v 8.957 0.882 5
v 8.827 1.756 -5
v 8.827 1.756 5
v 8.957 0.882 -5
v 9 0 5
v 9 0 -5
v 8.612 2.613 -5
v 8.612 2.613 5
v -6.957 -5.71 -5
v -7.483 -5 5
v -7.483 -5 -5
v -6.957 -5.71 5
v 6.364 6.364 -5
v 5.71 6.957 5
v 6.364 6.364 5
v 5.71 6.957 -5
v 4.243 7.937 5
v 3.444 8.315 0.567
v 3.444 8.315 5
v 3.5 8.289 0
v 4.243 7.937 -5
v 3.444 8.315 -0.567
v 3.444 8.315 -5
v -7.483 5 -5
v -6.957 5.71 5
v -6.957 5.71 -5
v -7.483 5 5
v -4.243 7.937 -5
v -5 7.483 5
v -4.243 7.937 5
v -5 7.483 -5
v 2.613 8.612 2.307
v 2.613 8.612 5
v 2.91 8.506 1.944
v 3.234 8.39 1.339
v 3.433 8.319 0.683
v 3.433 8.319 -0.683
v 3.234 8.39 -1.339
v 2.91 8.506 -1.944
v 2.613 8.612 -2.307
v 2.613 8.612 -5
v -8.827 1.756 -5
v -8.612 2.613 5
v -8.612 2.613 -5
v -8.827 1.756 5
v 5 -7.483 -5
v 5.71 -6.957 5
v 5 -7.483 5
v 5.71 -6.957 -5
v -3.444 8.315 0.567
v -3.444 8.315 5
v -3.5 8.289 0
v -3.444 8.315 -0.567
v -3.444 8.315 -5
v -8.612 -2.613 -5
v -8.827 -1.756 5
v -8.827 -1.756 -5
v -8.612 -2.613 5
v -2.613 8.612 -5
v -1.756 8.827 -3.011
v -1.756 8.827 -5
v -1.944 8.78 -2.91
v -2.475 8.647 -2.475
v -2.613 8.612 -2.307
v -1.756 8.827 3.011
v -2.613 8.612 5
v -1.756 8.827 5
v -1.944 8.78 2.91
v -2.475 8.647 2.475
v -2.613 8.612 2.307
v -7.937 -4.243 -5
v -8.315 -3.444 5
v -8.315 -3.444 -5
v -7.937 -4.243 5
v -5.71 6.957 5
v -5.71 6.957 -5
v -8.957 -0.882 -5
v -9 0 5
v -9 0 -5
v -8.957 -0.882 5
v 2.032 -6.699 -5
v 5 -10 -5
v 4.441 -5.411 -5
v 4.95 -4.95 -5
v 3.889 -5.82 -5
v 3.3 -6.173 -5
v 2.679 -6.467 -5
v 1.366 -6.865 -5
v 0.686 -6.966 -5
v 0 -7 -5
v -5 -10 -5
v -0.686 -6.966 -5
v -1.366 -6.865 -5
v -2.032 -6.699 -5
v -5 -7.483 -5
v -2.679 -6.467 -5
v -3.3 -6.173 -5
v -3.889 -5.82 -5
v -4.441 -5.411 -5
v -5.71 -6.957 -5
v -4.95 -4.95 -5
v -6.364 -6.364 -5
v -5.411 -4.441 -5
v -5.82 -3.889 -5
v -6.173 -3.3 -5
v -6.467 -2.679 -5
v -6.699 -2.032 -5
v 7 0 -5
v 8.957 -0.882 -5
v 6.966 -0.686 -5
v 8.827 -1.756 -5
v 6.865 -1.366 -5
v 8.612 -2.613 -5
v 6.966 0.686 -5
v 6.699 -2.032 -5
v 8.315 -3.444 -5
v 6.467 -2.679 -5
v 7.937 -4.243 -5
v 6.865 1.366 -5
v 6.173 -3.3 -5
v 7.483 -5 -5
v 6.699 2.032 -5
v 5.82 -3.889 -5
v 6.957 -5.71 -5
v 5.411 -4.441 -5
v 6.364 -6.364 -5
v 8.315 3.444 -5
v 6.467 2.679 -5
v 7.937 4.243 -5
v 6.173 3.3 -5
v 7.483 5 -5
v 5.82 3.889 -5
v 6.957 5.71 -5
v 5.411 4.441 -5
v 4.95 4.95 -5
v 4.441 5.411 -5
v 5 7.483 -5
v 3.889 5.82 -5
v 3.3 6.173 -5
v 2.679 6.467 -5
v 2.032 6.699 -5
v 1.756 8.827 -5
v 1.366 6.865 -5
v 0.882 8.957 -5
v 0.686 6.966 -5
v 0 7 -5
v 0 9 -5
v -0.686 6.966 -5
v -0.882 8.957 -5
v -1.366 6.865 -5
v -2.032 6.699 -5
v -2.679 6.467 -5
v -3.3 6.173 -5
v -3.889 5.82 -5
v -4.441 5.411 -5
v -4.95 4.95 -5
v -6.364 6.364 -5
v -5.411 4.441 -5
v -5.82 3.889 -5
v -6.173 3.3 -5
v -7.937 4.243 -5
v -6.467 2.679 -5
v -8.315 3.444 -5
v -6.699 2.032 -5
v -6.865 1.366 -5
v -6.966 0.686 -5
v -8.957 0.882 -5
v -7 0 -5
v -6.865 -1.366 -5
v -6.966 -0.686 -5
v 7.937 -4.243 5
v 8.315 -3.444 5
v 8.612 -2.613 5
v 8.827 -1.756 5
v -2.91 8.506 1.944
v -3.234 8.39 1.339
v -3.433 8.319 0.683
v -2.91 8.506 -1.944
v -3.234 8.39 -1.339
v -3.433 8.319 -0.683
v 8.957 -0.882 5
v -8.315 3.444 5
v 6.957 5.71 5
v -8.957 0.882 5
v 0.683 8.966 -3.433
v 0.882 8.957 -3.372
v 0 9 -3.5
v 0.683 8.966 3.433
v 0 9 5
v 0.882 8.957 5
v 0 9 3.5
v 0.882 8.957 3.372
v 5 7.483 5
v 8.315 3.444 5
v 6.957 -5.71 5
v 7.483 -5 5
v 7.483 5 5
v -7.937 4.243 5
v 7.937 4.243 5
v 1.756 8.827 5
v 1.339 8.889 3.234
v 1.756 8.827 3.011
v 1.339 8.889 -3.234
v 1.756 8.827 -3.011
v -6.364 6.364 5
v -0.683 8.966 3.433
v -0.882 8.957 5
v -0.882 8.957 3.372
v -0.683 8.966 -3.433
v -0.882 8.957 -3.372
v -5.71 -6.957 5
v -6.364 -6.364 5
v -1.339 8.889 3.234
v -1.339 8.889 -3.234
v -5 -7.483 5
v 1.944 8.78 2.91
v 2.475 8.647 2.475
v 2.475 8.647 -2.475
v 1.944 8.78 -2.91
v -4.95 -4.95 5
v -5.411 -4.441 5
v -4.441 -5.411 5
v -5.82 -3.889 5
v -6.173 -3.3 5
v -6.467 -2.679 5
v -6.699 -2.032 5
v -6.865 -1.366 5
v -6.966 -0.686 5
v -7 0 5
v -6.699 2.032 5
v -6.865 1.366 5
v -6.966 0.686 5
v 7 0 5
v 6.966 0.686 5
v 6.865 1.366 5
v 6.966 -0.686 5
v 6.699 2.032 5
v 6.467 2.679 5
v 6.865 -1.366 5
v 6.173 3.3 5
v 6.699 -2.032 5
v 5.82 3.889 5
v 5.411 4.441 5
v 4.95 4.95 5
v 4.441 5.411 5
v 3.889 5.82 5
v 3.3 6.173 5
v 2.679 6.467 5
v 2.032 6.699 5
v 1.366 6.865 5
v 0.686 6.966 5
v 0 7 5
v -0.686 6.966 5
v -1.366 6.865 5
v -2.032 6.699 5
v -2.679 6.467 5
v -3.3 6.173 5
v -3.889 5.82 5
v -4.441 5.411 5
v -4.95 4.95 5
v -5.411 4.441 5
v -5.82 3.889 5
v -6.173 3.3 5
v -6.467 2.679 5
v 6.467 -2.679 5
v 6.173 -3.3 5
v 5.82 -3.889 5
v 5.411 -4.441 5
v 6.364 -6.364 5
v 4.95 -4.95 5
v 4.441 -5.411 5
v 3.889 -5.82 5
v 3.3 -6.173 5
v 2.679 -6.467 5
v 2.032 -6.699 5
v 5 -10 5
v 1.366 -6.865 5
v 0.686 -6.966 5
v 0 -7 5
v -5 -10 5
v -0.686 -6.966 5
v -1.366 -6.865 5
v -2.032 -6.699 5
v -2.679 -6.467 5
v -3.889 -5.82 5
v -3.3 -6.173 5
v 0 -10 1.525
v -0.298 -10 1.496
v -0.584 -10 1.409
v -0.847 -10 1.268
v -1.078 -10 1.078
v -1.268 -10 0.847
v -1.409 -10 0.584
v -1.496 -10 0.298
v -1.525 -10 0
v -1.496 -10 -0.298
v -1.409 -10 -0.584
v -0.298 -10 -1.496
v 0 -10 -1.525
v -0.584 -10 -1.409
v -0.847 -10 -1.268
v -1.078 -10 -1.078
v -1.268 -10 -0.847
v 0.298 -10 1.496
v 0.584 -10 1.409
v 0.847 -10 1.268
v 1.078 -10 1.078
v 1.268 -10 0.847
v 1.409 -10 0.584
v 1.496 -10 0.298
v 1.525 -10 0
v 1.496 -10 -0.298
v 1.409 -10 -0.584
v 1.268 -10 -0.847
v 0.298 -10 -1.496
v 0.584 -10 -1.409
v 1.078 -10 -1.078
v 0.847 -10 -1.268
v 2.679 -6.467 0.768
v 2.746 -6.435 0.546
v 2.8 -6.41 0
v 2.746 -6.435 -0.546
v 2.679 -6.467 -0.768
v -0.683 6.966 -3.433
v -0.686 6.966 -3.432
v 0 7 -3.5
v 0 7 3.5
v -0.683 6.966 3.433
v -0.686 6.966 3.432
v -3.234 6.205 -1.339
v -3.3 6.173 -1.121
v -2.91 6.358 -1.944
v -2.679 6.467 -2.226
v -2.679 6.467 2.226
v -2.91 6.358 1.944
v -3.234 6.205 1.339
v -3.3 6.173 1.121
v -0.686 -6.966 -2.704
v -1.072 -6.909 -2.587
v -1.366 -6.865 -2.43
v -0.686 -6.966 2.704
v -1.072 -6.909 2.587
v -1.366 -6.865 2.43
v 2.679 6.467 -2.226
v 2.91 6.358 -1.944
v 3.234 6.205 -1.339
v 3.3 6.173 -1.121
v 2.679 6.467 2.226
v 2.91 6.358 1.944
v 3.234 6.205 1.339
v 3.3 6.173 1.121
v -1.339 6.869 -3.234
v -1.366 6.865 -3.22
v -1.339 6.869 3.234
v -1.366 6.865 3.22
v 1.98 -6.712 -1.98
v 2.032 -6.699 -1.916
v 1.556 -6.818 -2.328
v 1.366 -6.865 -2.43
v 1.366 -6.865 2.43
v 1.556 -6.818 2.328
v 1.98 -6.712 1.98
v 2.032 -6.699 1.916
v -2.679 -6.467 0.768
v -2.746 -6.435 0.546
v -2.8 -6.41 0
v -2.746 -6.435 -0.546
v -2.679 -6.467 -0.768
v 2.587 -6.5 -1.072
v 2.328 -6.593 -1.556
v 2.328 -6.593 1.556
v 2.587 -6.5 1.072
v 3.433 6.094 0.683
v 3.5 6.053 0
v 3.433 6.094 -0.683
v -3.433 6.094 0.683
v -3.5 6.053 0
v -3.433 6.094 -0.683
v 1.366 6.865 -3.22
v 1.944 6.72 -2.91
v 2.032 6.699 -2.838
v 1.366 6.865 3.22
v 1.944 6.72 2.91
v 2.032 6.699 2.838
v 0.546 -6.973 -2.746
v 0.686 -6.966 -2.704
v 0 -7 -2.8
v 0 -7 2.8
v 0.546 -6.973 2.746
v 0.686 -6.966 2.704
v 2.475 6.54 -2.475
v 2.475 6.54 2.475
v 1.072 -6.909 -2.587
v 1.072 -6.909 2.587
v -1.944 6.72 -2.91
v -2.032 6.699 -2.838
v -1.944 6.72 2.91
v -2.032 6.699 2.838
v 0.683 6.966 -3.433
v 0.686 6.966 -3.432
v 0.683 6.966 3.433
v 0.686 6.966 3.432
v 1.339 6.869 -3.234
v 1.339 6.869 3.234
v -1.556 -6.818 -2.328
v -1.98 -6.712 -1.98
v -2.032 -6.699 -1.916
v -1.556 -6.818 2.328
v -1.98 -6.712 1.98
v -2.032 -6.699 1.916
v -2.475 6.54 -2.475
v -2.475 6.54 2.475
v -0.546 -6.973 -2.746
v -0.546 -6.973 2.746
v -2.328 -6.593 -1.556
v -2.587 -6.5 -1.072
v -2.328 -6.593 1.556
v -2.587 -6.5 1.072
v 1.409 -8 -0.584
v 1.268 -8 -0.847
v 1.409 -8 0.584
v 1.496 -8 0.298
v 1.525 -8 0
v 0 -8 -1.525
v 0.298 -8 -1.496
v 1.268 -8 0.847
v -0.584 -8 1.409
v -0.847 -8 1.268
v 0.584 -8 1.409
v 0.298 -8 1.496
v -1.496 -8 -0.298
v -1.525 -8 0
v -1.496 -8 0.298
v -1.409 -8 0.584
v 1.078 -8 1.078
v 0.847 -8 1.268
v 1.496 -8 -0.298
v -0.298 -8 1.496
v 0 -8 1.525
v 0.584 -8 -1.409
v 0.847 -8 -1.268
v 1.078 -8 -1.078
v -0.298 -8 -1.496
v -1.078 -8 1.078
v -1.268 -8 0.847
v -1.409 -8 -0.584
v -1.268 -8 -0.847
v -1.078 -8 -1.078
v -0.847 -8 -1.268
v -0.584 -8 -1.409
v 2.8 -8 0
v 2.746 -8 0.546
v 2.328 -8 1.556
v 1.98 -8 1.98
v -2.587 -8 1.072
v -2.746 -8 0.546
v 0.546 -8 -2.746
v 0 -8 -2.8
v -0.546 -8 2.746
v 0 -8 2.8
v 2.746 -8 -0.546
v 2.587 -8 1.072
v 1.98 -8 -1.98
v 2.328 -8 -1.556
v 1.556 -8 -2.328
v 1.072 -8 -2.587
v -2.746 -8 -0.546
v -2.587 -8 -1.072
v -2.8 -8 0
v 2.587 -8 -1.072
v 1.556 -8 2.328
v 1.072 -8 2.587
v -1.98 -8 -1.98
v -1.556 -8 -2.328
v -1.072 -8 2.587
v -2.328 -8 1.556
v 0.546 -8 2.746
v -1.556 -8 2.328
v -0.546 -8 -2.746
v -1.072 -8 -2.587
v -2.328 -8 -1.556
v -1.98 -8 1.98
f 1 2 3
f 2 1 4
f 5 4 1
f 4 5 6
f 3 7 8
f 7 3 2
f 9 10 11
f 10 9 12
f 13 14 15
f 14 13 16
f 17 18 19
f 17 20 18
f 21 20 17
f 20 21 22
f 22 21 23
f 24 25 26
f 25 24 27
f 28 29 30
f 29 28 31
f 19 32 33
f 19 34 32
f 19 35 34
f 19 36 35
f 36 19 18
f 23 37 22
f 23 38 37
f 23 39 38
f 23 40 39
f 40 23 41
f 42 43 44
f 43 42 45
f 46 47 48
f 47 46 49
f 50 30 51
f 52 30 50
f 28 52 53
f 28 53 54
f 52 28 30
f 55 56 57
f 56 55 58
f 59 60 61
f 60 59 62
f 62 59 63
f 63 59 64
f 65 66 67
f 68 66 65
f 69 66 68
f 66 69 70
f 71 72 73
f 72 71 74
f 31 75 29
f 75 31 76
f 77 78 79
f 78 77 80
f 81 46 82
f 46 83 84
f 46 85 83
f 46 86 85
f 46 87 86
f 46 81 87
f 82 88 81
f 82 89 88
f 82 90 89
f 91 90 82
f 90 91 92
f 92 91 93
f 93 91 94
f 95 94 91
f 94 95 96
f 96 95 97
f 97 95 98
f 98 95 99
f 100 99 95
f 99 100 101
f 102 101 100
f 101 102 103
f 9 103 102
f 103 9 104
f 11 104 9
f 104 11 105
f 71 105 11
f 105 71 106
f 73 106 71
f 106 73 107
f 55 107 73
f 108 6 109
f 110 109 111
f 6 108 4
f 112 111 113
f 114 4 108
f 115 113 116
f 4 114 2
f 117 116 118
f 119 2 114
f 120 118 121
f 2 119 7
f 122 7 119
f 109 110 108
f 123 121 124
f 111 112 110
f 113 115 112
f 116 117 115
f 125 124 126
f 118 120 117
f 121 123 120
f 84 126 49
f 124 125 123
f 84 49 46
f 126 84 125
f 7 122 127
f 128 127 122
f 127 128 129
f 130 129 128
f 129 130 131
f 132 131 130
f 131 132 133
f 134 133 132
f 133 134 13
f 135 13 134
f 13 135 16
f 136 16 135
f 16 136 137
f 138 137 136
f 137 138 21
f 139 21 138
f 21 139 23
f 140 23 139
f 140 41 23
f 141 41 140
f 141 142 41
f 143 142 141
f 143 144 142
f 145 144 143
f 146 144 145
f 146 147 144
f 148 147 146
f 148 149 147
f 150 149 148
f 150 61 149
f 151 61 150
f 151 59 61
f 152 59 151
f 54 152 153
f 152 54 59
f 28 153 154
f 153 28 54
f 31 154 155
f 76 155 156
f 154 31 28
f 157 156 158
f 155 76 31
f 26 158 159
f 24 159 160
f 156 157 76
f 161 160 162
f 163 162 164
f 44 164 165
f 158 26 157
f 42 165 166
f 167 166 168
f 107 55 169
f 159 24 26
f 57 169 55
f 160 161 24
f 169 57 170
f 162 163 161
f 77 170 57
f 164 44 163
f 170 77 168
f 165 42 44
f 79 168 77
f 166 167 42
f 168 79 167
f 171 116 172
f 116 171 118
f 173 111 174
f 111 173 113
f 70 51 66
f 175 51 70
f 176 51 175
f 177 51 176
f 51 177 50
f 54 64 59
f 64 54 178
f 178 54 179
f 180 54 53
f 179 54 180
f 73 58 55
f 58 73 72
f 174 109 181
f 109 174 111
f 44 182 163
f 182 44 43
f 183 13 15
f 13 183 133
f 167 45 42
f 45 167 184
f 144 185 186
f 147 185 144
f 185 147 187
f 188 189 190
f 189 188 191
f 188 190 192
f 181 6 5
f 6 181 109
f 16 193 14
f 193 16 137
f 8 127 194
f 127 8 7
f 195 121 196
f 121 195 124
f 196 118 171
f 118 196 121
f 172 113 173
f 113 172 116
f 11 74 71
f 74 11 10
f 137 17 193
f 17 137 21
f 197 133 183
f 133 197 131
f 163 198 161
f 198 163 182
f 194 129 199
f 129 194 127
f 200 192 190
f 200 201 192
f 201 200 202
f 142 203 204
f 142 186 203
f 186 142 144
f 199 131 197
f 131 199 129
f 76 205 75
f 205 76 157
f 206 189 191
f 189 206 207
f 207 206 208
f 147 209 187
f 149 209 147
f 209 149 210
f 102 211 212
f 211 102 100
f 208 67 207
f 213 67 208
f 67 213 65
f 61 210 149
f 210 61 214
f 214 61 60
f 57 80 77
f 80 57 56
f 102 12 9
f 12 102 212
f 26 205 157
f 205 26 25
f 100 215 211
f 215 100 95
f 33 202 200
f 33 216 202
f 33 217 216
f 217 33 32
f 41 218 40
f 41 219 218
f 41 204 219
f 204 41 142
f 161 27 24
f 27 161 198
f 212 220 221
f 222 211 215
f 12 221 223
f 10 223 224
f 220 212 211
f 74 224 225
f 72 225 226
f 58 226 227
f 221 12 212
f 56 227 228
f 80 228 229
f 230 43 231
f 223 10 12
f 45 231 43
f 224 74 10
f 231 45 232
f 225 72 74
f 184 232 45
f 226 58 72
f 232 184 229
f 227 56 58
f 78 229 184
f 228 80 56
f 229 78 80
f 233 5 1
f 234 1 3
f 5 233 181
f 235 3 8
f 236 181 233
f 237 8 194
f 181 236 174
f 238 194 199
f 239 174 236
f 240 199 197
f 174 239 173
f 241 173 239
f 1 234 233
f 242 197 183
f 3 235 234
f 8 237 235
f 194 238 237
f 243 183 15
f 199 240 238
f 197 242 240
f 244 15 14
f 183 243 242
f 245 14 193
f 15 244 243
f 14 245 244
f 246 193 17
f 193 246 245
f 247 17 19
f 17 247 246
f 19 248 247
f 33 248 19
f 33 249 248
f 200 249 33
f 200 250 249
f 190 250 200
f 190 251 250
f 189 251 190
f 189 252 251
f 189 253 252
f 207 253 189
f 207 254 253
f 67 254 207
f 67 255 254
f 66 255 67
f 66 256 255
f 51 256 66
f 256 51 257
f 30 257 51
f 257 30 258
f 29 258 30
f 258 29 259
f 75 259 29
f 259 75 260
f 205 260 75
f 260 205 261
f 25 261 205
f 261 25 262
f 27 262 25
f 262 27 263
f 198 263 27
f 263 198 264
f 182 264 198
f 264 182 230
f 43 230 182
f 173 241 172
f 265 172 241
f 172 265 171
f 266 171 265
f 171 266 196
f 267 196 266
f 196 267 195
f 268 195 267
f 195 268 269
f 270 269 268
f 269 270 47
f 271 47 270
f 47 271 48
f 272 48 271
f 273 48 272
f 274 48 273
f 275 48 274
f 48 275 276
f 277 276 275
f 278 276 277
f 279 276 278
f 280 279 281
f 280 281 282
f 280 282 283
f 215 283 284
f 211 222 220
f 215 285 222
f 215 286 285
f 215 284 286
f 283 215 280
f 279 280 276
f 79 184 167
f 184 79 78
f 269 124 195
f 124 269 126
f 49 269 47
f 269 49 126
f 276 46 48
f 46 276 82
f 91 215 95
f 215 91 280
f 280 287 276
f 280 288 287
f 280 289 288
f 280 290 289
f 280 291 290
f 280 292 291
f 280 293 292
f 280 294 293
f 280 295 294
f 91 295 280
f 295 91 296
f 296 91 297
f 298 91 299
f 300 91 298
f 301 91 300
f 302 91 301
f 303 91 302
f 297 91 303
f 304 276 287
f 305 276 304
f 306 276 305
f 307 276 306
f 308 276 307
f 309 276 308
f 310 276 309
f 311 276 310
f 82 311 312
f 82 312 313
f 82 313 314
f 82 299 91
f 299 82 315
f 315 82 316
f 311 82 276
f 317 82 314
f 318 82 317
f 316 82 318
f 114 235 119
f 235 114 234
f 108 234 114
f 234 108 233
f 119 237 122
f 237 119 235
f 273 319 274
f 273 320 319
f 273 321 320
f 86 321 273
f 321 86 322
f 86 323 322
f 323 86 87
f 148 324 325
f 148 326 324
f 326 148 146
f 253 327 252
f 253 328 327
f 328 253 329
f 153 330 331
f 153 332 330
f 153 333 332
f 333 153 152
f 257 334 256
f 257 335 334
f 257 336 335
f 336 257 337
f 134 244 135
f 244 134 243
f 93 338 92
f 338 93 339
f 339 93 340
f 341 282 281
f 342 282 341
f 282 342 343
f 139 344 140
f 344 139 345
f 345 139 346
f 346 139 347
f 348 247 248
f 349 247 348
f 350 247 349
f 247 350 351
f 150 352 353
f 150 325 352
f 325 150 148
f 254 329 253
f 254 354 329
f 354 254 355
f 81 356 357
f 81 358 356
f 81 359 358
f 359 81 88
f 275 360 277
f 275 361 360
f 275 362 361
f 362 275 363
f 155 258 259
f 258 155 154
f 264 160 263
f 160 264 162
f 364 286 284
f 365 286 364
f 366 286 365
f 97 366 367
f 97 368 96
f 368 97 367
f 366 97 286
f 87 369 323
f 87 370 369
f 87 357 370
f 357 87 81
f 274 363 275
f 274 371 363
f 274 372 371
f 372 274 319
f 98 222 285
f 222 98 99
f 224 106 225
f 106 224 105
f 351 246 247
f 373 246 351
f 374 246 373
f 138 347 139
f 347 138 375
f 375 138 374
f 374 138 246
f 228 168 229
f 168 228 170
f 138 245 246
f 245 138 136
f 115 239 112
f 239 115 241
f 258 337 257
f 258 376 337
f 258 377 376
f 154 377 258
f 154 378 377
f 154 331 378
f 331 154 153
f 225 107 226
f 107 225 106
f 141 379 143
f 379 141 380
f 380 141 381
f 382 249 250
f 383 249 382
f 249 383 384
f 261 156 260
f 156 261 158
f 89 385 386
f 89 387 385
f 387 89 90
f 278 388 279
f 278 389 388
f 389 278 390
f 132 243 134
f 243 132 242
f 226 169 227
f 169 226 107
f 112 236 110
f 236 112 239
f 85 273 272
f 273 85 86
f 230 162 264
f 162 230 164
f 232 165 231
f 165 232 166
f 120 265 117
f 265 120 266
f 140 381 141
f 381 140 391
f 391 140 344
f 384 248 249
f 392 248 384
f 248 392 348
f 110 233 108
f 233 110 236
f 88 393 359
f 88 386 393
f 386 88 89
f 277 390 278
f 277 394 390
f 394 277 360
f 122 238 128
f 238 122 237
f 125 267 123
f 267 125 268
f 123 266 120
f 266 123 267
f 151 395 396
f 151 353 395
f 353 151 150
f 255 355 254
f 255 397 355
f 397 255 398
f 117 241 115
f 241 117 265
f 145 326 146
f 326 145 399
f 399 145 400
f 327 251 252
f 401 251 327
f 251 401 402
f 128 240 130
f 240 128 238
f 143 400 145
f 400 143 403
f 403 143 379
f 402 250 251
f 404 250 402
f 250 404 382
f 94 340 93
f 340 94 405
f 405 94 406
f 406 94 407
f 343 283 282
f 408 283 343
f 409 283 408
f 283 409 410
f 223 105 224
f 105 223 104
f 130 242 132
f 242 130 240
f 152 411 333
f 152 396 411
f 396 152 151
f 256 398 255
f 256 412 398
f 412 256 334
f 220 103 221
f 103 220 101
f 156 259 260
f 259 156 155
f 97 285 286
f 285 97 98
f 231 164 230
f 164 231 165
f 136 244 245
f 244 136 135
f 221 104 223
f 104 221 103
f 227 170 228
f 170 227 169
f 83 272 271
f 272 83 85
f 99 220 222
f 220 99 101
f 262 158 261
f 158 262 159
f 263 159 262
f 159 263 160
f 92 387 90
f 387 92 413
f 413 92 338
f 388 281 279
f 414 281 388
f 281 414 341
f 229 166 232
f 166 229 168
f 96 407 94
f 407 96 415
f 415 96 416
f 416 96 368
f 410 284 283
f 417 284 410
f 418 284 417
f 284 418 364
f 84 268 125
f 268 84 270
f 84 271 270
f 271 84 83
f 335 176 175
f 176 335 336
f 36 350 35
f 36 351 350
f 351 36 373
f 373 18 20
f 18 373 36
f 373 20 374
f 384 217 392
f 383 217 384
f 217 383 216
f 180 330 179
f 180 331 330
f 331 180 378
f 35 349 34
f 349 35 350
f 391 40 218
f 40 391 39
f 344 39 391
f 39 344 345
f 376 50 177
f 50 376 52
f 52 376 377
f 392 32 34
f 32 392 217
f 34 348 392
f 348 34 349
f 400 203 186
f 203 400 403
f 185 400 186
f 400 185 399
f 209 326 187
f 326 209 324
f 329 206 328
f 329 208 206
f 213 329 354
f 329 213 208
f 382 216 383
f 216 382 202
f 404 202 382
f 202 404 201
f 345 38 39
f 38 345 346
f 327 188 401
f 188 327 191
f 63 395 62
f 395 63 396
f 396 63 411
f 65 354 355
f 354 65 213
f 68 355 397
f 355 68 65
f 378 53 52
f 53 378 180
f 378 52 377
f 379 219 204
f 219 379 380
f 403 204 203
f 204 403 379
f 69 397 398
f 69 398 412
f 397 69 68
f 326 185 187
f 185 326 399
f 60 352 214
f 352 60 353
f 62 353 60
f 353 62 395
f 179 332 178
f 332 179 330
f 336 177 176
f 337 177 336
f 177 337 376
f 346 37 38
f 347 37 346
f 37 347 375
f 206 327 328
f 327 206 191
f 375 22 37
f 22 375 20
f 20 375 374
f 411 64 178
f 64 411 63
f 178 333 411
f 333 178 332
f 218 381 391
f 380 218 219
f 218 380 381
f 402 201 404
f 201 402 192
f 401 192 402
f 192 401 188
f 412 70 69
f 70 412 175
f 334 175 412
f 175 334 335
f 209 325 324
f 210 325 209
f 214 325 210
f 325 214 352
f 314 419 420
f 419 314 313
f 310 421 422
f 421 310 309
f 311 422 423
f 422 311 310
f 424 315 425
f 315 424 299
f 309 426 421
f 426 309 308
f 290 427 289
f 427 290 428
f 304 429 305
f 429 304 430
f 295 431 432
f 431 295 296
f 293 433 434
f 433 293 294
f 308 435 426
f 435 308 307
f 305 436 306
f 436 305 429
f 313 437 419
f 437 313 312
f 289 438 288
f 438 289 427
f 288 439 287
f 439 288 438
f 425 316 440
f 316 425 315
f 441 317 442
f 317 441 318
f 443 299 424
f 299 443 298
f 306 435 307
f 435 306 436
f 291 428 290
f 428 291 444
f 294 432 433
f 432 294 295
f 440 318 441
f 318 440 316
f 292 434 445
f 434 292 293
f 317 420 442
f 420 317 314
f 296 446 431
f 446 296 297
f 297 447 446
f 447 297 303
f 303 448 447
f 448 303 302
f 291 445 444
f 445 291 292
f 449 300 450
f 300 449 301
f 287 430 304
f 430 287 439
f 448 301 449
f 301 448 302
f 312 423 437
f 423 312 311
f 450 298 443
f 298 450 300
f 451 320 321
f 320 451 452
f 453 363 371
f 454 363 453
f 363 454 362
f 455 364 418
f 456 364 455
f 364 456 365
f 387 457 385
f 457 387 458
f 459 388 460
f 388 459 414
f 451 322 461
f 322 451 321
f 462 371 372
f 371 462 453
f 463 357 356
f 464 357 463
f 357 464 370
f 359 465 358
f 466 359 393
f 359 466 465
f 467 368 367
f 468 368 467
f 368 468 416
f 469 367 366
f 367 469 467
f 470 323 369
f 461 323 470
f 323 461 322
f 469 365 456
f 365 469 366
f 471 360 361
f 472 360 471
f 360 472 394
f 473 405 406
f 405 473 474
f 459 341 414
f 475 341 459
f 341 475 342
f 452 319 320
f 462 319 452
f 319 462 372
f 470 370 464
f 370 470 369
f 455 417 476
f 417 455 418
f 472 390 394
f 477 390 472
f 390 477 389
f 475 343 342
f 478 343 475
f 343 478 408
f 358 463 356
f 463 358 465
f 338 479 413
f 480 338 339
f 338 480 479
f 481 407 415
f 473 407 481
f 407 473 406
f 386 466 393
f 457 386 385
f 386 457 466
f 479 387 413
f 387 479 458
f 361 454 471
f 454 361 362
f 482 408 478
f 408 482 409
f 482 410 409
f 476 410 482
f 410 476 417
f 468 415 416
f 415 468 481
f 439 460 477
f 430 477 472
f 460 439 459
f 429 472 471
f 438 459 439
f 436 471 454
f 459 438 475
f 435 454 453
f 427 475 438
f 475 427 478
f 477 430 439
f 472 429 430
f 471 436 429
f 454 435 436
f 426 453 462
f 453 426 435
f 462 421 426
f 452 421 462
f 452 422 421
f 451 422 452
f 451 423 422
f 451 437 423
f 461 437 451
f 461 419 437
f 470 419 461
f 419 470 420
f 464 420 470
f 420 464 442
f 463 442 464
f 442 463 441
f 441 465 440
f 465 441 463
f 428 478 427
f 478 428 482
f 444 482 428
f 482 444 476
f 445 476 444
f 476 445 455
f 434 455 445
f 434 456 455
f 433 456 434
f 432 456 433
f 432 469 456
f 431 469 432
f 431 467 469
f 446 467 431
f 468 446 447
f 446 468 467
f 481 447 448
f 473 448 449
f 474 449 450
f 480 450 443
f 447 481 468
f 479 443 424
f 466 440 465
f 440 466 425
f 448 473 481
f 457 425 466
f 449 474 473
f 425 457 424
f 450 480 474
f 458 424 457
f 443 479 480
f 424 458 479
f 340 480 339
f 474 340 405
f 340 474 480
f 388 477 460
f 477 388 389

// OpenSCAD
// file: configuration.scad
// Increase this if your slicer or printer make holes too tight.
extra_radius = 0.1;
extra_extrusion_width = 0.5;

// OD = outside diameter, corner to corner.
m3_nut_od = 6.1;
m3_nut_radius = m3_nut_od/2 + 0.35 + extra_radius;
m3_washer_radius = 3.5 + extra_radius;

// Major diameter of metric 3mm thread.
m3_major = 2.85;
m3_radius = m3_major/2 + extra_radius;
m3_wide_radius = m3_major/2 + extra_radius;

// NEMA17 stepper motors.
motor_shaft_diameter = 5;
motor_shaft_radius = motor_shaft_diameter/2 + extra_radius;

// Frame brackets. M3x8mm screws work best with 3.6 mm brackets.
thickness = 3.6;

// OpenBeam or Misumi. Currently only 15x15 mm, but there is a plan
// to make models more parametric and allow 20x20 mm in the future.
extrusion = 15;

// Placement for the NEMA17 stepper motors.
motor_offset = 44;
motor_length = 47;
// main file
include <configuration.scad>;

radius = 9;

module cable_hook(){
	difference(){
		union(){
			cylinder(r=radius, h=10, $fn=64, center=true);
			translate([0,-(radius-.5), 0]) cube([10, 3, 10], center=true);
		}
		cylinder(r=radius-2, h=12, $fn=64, center=true);
		translate([0,radius,0]) rotate([90,0,0]) cylinder(r=3.5, h=8, center=true, $fn=32);
		translate([0,-radius,0]) rotate([90,0,0]) cylinder(r=m3_wide_radius, h=8, center=true, $fn=32);
		translate([0,-(radius-2),0]) rotate([90,0,0]) cylinder(r=2.8, h=2, center=true, $fn=32);
	}
}

cable_hook();
